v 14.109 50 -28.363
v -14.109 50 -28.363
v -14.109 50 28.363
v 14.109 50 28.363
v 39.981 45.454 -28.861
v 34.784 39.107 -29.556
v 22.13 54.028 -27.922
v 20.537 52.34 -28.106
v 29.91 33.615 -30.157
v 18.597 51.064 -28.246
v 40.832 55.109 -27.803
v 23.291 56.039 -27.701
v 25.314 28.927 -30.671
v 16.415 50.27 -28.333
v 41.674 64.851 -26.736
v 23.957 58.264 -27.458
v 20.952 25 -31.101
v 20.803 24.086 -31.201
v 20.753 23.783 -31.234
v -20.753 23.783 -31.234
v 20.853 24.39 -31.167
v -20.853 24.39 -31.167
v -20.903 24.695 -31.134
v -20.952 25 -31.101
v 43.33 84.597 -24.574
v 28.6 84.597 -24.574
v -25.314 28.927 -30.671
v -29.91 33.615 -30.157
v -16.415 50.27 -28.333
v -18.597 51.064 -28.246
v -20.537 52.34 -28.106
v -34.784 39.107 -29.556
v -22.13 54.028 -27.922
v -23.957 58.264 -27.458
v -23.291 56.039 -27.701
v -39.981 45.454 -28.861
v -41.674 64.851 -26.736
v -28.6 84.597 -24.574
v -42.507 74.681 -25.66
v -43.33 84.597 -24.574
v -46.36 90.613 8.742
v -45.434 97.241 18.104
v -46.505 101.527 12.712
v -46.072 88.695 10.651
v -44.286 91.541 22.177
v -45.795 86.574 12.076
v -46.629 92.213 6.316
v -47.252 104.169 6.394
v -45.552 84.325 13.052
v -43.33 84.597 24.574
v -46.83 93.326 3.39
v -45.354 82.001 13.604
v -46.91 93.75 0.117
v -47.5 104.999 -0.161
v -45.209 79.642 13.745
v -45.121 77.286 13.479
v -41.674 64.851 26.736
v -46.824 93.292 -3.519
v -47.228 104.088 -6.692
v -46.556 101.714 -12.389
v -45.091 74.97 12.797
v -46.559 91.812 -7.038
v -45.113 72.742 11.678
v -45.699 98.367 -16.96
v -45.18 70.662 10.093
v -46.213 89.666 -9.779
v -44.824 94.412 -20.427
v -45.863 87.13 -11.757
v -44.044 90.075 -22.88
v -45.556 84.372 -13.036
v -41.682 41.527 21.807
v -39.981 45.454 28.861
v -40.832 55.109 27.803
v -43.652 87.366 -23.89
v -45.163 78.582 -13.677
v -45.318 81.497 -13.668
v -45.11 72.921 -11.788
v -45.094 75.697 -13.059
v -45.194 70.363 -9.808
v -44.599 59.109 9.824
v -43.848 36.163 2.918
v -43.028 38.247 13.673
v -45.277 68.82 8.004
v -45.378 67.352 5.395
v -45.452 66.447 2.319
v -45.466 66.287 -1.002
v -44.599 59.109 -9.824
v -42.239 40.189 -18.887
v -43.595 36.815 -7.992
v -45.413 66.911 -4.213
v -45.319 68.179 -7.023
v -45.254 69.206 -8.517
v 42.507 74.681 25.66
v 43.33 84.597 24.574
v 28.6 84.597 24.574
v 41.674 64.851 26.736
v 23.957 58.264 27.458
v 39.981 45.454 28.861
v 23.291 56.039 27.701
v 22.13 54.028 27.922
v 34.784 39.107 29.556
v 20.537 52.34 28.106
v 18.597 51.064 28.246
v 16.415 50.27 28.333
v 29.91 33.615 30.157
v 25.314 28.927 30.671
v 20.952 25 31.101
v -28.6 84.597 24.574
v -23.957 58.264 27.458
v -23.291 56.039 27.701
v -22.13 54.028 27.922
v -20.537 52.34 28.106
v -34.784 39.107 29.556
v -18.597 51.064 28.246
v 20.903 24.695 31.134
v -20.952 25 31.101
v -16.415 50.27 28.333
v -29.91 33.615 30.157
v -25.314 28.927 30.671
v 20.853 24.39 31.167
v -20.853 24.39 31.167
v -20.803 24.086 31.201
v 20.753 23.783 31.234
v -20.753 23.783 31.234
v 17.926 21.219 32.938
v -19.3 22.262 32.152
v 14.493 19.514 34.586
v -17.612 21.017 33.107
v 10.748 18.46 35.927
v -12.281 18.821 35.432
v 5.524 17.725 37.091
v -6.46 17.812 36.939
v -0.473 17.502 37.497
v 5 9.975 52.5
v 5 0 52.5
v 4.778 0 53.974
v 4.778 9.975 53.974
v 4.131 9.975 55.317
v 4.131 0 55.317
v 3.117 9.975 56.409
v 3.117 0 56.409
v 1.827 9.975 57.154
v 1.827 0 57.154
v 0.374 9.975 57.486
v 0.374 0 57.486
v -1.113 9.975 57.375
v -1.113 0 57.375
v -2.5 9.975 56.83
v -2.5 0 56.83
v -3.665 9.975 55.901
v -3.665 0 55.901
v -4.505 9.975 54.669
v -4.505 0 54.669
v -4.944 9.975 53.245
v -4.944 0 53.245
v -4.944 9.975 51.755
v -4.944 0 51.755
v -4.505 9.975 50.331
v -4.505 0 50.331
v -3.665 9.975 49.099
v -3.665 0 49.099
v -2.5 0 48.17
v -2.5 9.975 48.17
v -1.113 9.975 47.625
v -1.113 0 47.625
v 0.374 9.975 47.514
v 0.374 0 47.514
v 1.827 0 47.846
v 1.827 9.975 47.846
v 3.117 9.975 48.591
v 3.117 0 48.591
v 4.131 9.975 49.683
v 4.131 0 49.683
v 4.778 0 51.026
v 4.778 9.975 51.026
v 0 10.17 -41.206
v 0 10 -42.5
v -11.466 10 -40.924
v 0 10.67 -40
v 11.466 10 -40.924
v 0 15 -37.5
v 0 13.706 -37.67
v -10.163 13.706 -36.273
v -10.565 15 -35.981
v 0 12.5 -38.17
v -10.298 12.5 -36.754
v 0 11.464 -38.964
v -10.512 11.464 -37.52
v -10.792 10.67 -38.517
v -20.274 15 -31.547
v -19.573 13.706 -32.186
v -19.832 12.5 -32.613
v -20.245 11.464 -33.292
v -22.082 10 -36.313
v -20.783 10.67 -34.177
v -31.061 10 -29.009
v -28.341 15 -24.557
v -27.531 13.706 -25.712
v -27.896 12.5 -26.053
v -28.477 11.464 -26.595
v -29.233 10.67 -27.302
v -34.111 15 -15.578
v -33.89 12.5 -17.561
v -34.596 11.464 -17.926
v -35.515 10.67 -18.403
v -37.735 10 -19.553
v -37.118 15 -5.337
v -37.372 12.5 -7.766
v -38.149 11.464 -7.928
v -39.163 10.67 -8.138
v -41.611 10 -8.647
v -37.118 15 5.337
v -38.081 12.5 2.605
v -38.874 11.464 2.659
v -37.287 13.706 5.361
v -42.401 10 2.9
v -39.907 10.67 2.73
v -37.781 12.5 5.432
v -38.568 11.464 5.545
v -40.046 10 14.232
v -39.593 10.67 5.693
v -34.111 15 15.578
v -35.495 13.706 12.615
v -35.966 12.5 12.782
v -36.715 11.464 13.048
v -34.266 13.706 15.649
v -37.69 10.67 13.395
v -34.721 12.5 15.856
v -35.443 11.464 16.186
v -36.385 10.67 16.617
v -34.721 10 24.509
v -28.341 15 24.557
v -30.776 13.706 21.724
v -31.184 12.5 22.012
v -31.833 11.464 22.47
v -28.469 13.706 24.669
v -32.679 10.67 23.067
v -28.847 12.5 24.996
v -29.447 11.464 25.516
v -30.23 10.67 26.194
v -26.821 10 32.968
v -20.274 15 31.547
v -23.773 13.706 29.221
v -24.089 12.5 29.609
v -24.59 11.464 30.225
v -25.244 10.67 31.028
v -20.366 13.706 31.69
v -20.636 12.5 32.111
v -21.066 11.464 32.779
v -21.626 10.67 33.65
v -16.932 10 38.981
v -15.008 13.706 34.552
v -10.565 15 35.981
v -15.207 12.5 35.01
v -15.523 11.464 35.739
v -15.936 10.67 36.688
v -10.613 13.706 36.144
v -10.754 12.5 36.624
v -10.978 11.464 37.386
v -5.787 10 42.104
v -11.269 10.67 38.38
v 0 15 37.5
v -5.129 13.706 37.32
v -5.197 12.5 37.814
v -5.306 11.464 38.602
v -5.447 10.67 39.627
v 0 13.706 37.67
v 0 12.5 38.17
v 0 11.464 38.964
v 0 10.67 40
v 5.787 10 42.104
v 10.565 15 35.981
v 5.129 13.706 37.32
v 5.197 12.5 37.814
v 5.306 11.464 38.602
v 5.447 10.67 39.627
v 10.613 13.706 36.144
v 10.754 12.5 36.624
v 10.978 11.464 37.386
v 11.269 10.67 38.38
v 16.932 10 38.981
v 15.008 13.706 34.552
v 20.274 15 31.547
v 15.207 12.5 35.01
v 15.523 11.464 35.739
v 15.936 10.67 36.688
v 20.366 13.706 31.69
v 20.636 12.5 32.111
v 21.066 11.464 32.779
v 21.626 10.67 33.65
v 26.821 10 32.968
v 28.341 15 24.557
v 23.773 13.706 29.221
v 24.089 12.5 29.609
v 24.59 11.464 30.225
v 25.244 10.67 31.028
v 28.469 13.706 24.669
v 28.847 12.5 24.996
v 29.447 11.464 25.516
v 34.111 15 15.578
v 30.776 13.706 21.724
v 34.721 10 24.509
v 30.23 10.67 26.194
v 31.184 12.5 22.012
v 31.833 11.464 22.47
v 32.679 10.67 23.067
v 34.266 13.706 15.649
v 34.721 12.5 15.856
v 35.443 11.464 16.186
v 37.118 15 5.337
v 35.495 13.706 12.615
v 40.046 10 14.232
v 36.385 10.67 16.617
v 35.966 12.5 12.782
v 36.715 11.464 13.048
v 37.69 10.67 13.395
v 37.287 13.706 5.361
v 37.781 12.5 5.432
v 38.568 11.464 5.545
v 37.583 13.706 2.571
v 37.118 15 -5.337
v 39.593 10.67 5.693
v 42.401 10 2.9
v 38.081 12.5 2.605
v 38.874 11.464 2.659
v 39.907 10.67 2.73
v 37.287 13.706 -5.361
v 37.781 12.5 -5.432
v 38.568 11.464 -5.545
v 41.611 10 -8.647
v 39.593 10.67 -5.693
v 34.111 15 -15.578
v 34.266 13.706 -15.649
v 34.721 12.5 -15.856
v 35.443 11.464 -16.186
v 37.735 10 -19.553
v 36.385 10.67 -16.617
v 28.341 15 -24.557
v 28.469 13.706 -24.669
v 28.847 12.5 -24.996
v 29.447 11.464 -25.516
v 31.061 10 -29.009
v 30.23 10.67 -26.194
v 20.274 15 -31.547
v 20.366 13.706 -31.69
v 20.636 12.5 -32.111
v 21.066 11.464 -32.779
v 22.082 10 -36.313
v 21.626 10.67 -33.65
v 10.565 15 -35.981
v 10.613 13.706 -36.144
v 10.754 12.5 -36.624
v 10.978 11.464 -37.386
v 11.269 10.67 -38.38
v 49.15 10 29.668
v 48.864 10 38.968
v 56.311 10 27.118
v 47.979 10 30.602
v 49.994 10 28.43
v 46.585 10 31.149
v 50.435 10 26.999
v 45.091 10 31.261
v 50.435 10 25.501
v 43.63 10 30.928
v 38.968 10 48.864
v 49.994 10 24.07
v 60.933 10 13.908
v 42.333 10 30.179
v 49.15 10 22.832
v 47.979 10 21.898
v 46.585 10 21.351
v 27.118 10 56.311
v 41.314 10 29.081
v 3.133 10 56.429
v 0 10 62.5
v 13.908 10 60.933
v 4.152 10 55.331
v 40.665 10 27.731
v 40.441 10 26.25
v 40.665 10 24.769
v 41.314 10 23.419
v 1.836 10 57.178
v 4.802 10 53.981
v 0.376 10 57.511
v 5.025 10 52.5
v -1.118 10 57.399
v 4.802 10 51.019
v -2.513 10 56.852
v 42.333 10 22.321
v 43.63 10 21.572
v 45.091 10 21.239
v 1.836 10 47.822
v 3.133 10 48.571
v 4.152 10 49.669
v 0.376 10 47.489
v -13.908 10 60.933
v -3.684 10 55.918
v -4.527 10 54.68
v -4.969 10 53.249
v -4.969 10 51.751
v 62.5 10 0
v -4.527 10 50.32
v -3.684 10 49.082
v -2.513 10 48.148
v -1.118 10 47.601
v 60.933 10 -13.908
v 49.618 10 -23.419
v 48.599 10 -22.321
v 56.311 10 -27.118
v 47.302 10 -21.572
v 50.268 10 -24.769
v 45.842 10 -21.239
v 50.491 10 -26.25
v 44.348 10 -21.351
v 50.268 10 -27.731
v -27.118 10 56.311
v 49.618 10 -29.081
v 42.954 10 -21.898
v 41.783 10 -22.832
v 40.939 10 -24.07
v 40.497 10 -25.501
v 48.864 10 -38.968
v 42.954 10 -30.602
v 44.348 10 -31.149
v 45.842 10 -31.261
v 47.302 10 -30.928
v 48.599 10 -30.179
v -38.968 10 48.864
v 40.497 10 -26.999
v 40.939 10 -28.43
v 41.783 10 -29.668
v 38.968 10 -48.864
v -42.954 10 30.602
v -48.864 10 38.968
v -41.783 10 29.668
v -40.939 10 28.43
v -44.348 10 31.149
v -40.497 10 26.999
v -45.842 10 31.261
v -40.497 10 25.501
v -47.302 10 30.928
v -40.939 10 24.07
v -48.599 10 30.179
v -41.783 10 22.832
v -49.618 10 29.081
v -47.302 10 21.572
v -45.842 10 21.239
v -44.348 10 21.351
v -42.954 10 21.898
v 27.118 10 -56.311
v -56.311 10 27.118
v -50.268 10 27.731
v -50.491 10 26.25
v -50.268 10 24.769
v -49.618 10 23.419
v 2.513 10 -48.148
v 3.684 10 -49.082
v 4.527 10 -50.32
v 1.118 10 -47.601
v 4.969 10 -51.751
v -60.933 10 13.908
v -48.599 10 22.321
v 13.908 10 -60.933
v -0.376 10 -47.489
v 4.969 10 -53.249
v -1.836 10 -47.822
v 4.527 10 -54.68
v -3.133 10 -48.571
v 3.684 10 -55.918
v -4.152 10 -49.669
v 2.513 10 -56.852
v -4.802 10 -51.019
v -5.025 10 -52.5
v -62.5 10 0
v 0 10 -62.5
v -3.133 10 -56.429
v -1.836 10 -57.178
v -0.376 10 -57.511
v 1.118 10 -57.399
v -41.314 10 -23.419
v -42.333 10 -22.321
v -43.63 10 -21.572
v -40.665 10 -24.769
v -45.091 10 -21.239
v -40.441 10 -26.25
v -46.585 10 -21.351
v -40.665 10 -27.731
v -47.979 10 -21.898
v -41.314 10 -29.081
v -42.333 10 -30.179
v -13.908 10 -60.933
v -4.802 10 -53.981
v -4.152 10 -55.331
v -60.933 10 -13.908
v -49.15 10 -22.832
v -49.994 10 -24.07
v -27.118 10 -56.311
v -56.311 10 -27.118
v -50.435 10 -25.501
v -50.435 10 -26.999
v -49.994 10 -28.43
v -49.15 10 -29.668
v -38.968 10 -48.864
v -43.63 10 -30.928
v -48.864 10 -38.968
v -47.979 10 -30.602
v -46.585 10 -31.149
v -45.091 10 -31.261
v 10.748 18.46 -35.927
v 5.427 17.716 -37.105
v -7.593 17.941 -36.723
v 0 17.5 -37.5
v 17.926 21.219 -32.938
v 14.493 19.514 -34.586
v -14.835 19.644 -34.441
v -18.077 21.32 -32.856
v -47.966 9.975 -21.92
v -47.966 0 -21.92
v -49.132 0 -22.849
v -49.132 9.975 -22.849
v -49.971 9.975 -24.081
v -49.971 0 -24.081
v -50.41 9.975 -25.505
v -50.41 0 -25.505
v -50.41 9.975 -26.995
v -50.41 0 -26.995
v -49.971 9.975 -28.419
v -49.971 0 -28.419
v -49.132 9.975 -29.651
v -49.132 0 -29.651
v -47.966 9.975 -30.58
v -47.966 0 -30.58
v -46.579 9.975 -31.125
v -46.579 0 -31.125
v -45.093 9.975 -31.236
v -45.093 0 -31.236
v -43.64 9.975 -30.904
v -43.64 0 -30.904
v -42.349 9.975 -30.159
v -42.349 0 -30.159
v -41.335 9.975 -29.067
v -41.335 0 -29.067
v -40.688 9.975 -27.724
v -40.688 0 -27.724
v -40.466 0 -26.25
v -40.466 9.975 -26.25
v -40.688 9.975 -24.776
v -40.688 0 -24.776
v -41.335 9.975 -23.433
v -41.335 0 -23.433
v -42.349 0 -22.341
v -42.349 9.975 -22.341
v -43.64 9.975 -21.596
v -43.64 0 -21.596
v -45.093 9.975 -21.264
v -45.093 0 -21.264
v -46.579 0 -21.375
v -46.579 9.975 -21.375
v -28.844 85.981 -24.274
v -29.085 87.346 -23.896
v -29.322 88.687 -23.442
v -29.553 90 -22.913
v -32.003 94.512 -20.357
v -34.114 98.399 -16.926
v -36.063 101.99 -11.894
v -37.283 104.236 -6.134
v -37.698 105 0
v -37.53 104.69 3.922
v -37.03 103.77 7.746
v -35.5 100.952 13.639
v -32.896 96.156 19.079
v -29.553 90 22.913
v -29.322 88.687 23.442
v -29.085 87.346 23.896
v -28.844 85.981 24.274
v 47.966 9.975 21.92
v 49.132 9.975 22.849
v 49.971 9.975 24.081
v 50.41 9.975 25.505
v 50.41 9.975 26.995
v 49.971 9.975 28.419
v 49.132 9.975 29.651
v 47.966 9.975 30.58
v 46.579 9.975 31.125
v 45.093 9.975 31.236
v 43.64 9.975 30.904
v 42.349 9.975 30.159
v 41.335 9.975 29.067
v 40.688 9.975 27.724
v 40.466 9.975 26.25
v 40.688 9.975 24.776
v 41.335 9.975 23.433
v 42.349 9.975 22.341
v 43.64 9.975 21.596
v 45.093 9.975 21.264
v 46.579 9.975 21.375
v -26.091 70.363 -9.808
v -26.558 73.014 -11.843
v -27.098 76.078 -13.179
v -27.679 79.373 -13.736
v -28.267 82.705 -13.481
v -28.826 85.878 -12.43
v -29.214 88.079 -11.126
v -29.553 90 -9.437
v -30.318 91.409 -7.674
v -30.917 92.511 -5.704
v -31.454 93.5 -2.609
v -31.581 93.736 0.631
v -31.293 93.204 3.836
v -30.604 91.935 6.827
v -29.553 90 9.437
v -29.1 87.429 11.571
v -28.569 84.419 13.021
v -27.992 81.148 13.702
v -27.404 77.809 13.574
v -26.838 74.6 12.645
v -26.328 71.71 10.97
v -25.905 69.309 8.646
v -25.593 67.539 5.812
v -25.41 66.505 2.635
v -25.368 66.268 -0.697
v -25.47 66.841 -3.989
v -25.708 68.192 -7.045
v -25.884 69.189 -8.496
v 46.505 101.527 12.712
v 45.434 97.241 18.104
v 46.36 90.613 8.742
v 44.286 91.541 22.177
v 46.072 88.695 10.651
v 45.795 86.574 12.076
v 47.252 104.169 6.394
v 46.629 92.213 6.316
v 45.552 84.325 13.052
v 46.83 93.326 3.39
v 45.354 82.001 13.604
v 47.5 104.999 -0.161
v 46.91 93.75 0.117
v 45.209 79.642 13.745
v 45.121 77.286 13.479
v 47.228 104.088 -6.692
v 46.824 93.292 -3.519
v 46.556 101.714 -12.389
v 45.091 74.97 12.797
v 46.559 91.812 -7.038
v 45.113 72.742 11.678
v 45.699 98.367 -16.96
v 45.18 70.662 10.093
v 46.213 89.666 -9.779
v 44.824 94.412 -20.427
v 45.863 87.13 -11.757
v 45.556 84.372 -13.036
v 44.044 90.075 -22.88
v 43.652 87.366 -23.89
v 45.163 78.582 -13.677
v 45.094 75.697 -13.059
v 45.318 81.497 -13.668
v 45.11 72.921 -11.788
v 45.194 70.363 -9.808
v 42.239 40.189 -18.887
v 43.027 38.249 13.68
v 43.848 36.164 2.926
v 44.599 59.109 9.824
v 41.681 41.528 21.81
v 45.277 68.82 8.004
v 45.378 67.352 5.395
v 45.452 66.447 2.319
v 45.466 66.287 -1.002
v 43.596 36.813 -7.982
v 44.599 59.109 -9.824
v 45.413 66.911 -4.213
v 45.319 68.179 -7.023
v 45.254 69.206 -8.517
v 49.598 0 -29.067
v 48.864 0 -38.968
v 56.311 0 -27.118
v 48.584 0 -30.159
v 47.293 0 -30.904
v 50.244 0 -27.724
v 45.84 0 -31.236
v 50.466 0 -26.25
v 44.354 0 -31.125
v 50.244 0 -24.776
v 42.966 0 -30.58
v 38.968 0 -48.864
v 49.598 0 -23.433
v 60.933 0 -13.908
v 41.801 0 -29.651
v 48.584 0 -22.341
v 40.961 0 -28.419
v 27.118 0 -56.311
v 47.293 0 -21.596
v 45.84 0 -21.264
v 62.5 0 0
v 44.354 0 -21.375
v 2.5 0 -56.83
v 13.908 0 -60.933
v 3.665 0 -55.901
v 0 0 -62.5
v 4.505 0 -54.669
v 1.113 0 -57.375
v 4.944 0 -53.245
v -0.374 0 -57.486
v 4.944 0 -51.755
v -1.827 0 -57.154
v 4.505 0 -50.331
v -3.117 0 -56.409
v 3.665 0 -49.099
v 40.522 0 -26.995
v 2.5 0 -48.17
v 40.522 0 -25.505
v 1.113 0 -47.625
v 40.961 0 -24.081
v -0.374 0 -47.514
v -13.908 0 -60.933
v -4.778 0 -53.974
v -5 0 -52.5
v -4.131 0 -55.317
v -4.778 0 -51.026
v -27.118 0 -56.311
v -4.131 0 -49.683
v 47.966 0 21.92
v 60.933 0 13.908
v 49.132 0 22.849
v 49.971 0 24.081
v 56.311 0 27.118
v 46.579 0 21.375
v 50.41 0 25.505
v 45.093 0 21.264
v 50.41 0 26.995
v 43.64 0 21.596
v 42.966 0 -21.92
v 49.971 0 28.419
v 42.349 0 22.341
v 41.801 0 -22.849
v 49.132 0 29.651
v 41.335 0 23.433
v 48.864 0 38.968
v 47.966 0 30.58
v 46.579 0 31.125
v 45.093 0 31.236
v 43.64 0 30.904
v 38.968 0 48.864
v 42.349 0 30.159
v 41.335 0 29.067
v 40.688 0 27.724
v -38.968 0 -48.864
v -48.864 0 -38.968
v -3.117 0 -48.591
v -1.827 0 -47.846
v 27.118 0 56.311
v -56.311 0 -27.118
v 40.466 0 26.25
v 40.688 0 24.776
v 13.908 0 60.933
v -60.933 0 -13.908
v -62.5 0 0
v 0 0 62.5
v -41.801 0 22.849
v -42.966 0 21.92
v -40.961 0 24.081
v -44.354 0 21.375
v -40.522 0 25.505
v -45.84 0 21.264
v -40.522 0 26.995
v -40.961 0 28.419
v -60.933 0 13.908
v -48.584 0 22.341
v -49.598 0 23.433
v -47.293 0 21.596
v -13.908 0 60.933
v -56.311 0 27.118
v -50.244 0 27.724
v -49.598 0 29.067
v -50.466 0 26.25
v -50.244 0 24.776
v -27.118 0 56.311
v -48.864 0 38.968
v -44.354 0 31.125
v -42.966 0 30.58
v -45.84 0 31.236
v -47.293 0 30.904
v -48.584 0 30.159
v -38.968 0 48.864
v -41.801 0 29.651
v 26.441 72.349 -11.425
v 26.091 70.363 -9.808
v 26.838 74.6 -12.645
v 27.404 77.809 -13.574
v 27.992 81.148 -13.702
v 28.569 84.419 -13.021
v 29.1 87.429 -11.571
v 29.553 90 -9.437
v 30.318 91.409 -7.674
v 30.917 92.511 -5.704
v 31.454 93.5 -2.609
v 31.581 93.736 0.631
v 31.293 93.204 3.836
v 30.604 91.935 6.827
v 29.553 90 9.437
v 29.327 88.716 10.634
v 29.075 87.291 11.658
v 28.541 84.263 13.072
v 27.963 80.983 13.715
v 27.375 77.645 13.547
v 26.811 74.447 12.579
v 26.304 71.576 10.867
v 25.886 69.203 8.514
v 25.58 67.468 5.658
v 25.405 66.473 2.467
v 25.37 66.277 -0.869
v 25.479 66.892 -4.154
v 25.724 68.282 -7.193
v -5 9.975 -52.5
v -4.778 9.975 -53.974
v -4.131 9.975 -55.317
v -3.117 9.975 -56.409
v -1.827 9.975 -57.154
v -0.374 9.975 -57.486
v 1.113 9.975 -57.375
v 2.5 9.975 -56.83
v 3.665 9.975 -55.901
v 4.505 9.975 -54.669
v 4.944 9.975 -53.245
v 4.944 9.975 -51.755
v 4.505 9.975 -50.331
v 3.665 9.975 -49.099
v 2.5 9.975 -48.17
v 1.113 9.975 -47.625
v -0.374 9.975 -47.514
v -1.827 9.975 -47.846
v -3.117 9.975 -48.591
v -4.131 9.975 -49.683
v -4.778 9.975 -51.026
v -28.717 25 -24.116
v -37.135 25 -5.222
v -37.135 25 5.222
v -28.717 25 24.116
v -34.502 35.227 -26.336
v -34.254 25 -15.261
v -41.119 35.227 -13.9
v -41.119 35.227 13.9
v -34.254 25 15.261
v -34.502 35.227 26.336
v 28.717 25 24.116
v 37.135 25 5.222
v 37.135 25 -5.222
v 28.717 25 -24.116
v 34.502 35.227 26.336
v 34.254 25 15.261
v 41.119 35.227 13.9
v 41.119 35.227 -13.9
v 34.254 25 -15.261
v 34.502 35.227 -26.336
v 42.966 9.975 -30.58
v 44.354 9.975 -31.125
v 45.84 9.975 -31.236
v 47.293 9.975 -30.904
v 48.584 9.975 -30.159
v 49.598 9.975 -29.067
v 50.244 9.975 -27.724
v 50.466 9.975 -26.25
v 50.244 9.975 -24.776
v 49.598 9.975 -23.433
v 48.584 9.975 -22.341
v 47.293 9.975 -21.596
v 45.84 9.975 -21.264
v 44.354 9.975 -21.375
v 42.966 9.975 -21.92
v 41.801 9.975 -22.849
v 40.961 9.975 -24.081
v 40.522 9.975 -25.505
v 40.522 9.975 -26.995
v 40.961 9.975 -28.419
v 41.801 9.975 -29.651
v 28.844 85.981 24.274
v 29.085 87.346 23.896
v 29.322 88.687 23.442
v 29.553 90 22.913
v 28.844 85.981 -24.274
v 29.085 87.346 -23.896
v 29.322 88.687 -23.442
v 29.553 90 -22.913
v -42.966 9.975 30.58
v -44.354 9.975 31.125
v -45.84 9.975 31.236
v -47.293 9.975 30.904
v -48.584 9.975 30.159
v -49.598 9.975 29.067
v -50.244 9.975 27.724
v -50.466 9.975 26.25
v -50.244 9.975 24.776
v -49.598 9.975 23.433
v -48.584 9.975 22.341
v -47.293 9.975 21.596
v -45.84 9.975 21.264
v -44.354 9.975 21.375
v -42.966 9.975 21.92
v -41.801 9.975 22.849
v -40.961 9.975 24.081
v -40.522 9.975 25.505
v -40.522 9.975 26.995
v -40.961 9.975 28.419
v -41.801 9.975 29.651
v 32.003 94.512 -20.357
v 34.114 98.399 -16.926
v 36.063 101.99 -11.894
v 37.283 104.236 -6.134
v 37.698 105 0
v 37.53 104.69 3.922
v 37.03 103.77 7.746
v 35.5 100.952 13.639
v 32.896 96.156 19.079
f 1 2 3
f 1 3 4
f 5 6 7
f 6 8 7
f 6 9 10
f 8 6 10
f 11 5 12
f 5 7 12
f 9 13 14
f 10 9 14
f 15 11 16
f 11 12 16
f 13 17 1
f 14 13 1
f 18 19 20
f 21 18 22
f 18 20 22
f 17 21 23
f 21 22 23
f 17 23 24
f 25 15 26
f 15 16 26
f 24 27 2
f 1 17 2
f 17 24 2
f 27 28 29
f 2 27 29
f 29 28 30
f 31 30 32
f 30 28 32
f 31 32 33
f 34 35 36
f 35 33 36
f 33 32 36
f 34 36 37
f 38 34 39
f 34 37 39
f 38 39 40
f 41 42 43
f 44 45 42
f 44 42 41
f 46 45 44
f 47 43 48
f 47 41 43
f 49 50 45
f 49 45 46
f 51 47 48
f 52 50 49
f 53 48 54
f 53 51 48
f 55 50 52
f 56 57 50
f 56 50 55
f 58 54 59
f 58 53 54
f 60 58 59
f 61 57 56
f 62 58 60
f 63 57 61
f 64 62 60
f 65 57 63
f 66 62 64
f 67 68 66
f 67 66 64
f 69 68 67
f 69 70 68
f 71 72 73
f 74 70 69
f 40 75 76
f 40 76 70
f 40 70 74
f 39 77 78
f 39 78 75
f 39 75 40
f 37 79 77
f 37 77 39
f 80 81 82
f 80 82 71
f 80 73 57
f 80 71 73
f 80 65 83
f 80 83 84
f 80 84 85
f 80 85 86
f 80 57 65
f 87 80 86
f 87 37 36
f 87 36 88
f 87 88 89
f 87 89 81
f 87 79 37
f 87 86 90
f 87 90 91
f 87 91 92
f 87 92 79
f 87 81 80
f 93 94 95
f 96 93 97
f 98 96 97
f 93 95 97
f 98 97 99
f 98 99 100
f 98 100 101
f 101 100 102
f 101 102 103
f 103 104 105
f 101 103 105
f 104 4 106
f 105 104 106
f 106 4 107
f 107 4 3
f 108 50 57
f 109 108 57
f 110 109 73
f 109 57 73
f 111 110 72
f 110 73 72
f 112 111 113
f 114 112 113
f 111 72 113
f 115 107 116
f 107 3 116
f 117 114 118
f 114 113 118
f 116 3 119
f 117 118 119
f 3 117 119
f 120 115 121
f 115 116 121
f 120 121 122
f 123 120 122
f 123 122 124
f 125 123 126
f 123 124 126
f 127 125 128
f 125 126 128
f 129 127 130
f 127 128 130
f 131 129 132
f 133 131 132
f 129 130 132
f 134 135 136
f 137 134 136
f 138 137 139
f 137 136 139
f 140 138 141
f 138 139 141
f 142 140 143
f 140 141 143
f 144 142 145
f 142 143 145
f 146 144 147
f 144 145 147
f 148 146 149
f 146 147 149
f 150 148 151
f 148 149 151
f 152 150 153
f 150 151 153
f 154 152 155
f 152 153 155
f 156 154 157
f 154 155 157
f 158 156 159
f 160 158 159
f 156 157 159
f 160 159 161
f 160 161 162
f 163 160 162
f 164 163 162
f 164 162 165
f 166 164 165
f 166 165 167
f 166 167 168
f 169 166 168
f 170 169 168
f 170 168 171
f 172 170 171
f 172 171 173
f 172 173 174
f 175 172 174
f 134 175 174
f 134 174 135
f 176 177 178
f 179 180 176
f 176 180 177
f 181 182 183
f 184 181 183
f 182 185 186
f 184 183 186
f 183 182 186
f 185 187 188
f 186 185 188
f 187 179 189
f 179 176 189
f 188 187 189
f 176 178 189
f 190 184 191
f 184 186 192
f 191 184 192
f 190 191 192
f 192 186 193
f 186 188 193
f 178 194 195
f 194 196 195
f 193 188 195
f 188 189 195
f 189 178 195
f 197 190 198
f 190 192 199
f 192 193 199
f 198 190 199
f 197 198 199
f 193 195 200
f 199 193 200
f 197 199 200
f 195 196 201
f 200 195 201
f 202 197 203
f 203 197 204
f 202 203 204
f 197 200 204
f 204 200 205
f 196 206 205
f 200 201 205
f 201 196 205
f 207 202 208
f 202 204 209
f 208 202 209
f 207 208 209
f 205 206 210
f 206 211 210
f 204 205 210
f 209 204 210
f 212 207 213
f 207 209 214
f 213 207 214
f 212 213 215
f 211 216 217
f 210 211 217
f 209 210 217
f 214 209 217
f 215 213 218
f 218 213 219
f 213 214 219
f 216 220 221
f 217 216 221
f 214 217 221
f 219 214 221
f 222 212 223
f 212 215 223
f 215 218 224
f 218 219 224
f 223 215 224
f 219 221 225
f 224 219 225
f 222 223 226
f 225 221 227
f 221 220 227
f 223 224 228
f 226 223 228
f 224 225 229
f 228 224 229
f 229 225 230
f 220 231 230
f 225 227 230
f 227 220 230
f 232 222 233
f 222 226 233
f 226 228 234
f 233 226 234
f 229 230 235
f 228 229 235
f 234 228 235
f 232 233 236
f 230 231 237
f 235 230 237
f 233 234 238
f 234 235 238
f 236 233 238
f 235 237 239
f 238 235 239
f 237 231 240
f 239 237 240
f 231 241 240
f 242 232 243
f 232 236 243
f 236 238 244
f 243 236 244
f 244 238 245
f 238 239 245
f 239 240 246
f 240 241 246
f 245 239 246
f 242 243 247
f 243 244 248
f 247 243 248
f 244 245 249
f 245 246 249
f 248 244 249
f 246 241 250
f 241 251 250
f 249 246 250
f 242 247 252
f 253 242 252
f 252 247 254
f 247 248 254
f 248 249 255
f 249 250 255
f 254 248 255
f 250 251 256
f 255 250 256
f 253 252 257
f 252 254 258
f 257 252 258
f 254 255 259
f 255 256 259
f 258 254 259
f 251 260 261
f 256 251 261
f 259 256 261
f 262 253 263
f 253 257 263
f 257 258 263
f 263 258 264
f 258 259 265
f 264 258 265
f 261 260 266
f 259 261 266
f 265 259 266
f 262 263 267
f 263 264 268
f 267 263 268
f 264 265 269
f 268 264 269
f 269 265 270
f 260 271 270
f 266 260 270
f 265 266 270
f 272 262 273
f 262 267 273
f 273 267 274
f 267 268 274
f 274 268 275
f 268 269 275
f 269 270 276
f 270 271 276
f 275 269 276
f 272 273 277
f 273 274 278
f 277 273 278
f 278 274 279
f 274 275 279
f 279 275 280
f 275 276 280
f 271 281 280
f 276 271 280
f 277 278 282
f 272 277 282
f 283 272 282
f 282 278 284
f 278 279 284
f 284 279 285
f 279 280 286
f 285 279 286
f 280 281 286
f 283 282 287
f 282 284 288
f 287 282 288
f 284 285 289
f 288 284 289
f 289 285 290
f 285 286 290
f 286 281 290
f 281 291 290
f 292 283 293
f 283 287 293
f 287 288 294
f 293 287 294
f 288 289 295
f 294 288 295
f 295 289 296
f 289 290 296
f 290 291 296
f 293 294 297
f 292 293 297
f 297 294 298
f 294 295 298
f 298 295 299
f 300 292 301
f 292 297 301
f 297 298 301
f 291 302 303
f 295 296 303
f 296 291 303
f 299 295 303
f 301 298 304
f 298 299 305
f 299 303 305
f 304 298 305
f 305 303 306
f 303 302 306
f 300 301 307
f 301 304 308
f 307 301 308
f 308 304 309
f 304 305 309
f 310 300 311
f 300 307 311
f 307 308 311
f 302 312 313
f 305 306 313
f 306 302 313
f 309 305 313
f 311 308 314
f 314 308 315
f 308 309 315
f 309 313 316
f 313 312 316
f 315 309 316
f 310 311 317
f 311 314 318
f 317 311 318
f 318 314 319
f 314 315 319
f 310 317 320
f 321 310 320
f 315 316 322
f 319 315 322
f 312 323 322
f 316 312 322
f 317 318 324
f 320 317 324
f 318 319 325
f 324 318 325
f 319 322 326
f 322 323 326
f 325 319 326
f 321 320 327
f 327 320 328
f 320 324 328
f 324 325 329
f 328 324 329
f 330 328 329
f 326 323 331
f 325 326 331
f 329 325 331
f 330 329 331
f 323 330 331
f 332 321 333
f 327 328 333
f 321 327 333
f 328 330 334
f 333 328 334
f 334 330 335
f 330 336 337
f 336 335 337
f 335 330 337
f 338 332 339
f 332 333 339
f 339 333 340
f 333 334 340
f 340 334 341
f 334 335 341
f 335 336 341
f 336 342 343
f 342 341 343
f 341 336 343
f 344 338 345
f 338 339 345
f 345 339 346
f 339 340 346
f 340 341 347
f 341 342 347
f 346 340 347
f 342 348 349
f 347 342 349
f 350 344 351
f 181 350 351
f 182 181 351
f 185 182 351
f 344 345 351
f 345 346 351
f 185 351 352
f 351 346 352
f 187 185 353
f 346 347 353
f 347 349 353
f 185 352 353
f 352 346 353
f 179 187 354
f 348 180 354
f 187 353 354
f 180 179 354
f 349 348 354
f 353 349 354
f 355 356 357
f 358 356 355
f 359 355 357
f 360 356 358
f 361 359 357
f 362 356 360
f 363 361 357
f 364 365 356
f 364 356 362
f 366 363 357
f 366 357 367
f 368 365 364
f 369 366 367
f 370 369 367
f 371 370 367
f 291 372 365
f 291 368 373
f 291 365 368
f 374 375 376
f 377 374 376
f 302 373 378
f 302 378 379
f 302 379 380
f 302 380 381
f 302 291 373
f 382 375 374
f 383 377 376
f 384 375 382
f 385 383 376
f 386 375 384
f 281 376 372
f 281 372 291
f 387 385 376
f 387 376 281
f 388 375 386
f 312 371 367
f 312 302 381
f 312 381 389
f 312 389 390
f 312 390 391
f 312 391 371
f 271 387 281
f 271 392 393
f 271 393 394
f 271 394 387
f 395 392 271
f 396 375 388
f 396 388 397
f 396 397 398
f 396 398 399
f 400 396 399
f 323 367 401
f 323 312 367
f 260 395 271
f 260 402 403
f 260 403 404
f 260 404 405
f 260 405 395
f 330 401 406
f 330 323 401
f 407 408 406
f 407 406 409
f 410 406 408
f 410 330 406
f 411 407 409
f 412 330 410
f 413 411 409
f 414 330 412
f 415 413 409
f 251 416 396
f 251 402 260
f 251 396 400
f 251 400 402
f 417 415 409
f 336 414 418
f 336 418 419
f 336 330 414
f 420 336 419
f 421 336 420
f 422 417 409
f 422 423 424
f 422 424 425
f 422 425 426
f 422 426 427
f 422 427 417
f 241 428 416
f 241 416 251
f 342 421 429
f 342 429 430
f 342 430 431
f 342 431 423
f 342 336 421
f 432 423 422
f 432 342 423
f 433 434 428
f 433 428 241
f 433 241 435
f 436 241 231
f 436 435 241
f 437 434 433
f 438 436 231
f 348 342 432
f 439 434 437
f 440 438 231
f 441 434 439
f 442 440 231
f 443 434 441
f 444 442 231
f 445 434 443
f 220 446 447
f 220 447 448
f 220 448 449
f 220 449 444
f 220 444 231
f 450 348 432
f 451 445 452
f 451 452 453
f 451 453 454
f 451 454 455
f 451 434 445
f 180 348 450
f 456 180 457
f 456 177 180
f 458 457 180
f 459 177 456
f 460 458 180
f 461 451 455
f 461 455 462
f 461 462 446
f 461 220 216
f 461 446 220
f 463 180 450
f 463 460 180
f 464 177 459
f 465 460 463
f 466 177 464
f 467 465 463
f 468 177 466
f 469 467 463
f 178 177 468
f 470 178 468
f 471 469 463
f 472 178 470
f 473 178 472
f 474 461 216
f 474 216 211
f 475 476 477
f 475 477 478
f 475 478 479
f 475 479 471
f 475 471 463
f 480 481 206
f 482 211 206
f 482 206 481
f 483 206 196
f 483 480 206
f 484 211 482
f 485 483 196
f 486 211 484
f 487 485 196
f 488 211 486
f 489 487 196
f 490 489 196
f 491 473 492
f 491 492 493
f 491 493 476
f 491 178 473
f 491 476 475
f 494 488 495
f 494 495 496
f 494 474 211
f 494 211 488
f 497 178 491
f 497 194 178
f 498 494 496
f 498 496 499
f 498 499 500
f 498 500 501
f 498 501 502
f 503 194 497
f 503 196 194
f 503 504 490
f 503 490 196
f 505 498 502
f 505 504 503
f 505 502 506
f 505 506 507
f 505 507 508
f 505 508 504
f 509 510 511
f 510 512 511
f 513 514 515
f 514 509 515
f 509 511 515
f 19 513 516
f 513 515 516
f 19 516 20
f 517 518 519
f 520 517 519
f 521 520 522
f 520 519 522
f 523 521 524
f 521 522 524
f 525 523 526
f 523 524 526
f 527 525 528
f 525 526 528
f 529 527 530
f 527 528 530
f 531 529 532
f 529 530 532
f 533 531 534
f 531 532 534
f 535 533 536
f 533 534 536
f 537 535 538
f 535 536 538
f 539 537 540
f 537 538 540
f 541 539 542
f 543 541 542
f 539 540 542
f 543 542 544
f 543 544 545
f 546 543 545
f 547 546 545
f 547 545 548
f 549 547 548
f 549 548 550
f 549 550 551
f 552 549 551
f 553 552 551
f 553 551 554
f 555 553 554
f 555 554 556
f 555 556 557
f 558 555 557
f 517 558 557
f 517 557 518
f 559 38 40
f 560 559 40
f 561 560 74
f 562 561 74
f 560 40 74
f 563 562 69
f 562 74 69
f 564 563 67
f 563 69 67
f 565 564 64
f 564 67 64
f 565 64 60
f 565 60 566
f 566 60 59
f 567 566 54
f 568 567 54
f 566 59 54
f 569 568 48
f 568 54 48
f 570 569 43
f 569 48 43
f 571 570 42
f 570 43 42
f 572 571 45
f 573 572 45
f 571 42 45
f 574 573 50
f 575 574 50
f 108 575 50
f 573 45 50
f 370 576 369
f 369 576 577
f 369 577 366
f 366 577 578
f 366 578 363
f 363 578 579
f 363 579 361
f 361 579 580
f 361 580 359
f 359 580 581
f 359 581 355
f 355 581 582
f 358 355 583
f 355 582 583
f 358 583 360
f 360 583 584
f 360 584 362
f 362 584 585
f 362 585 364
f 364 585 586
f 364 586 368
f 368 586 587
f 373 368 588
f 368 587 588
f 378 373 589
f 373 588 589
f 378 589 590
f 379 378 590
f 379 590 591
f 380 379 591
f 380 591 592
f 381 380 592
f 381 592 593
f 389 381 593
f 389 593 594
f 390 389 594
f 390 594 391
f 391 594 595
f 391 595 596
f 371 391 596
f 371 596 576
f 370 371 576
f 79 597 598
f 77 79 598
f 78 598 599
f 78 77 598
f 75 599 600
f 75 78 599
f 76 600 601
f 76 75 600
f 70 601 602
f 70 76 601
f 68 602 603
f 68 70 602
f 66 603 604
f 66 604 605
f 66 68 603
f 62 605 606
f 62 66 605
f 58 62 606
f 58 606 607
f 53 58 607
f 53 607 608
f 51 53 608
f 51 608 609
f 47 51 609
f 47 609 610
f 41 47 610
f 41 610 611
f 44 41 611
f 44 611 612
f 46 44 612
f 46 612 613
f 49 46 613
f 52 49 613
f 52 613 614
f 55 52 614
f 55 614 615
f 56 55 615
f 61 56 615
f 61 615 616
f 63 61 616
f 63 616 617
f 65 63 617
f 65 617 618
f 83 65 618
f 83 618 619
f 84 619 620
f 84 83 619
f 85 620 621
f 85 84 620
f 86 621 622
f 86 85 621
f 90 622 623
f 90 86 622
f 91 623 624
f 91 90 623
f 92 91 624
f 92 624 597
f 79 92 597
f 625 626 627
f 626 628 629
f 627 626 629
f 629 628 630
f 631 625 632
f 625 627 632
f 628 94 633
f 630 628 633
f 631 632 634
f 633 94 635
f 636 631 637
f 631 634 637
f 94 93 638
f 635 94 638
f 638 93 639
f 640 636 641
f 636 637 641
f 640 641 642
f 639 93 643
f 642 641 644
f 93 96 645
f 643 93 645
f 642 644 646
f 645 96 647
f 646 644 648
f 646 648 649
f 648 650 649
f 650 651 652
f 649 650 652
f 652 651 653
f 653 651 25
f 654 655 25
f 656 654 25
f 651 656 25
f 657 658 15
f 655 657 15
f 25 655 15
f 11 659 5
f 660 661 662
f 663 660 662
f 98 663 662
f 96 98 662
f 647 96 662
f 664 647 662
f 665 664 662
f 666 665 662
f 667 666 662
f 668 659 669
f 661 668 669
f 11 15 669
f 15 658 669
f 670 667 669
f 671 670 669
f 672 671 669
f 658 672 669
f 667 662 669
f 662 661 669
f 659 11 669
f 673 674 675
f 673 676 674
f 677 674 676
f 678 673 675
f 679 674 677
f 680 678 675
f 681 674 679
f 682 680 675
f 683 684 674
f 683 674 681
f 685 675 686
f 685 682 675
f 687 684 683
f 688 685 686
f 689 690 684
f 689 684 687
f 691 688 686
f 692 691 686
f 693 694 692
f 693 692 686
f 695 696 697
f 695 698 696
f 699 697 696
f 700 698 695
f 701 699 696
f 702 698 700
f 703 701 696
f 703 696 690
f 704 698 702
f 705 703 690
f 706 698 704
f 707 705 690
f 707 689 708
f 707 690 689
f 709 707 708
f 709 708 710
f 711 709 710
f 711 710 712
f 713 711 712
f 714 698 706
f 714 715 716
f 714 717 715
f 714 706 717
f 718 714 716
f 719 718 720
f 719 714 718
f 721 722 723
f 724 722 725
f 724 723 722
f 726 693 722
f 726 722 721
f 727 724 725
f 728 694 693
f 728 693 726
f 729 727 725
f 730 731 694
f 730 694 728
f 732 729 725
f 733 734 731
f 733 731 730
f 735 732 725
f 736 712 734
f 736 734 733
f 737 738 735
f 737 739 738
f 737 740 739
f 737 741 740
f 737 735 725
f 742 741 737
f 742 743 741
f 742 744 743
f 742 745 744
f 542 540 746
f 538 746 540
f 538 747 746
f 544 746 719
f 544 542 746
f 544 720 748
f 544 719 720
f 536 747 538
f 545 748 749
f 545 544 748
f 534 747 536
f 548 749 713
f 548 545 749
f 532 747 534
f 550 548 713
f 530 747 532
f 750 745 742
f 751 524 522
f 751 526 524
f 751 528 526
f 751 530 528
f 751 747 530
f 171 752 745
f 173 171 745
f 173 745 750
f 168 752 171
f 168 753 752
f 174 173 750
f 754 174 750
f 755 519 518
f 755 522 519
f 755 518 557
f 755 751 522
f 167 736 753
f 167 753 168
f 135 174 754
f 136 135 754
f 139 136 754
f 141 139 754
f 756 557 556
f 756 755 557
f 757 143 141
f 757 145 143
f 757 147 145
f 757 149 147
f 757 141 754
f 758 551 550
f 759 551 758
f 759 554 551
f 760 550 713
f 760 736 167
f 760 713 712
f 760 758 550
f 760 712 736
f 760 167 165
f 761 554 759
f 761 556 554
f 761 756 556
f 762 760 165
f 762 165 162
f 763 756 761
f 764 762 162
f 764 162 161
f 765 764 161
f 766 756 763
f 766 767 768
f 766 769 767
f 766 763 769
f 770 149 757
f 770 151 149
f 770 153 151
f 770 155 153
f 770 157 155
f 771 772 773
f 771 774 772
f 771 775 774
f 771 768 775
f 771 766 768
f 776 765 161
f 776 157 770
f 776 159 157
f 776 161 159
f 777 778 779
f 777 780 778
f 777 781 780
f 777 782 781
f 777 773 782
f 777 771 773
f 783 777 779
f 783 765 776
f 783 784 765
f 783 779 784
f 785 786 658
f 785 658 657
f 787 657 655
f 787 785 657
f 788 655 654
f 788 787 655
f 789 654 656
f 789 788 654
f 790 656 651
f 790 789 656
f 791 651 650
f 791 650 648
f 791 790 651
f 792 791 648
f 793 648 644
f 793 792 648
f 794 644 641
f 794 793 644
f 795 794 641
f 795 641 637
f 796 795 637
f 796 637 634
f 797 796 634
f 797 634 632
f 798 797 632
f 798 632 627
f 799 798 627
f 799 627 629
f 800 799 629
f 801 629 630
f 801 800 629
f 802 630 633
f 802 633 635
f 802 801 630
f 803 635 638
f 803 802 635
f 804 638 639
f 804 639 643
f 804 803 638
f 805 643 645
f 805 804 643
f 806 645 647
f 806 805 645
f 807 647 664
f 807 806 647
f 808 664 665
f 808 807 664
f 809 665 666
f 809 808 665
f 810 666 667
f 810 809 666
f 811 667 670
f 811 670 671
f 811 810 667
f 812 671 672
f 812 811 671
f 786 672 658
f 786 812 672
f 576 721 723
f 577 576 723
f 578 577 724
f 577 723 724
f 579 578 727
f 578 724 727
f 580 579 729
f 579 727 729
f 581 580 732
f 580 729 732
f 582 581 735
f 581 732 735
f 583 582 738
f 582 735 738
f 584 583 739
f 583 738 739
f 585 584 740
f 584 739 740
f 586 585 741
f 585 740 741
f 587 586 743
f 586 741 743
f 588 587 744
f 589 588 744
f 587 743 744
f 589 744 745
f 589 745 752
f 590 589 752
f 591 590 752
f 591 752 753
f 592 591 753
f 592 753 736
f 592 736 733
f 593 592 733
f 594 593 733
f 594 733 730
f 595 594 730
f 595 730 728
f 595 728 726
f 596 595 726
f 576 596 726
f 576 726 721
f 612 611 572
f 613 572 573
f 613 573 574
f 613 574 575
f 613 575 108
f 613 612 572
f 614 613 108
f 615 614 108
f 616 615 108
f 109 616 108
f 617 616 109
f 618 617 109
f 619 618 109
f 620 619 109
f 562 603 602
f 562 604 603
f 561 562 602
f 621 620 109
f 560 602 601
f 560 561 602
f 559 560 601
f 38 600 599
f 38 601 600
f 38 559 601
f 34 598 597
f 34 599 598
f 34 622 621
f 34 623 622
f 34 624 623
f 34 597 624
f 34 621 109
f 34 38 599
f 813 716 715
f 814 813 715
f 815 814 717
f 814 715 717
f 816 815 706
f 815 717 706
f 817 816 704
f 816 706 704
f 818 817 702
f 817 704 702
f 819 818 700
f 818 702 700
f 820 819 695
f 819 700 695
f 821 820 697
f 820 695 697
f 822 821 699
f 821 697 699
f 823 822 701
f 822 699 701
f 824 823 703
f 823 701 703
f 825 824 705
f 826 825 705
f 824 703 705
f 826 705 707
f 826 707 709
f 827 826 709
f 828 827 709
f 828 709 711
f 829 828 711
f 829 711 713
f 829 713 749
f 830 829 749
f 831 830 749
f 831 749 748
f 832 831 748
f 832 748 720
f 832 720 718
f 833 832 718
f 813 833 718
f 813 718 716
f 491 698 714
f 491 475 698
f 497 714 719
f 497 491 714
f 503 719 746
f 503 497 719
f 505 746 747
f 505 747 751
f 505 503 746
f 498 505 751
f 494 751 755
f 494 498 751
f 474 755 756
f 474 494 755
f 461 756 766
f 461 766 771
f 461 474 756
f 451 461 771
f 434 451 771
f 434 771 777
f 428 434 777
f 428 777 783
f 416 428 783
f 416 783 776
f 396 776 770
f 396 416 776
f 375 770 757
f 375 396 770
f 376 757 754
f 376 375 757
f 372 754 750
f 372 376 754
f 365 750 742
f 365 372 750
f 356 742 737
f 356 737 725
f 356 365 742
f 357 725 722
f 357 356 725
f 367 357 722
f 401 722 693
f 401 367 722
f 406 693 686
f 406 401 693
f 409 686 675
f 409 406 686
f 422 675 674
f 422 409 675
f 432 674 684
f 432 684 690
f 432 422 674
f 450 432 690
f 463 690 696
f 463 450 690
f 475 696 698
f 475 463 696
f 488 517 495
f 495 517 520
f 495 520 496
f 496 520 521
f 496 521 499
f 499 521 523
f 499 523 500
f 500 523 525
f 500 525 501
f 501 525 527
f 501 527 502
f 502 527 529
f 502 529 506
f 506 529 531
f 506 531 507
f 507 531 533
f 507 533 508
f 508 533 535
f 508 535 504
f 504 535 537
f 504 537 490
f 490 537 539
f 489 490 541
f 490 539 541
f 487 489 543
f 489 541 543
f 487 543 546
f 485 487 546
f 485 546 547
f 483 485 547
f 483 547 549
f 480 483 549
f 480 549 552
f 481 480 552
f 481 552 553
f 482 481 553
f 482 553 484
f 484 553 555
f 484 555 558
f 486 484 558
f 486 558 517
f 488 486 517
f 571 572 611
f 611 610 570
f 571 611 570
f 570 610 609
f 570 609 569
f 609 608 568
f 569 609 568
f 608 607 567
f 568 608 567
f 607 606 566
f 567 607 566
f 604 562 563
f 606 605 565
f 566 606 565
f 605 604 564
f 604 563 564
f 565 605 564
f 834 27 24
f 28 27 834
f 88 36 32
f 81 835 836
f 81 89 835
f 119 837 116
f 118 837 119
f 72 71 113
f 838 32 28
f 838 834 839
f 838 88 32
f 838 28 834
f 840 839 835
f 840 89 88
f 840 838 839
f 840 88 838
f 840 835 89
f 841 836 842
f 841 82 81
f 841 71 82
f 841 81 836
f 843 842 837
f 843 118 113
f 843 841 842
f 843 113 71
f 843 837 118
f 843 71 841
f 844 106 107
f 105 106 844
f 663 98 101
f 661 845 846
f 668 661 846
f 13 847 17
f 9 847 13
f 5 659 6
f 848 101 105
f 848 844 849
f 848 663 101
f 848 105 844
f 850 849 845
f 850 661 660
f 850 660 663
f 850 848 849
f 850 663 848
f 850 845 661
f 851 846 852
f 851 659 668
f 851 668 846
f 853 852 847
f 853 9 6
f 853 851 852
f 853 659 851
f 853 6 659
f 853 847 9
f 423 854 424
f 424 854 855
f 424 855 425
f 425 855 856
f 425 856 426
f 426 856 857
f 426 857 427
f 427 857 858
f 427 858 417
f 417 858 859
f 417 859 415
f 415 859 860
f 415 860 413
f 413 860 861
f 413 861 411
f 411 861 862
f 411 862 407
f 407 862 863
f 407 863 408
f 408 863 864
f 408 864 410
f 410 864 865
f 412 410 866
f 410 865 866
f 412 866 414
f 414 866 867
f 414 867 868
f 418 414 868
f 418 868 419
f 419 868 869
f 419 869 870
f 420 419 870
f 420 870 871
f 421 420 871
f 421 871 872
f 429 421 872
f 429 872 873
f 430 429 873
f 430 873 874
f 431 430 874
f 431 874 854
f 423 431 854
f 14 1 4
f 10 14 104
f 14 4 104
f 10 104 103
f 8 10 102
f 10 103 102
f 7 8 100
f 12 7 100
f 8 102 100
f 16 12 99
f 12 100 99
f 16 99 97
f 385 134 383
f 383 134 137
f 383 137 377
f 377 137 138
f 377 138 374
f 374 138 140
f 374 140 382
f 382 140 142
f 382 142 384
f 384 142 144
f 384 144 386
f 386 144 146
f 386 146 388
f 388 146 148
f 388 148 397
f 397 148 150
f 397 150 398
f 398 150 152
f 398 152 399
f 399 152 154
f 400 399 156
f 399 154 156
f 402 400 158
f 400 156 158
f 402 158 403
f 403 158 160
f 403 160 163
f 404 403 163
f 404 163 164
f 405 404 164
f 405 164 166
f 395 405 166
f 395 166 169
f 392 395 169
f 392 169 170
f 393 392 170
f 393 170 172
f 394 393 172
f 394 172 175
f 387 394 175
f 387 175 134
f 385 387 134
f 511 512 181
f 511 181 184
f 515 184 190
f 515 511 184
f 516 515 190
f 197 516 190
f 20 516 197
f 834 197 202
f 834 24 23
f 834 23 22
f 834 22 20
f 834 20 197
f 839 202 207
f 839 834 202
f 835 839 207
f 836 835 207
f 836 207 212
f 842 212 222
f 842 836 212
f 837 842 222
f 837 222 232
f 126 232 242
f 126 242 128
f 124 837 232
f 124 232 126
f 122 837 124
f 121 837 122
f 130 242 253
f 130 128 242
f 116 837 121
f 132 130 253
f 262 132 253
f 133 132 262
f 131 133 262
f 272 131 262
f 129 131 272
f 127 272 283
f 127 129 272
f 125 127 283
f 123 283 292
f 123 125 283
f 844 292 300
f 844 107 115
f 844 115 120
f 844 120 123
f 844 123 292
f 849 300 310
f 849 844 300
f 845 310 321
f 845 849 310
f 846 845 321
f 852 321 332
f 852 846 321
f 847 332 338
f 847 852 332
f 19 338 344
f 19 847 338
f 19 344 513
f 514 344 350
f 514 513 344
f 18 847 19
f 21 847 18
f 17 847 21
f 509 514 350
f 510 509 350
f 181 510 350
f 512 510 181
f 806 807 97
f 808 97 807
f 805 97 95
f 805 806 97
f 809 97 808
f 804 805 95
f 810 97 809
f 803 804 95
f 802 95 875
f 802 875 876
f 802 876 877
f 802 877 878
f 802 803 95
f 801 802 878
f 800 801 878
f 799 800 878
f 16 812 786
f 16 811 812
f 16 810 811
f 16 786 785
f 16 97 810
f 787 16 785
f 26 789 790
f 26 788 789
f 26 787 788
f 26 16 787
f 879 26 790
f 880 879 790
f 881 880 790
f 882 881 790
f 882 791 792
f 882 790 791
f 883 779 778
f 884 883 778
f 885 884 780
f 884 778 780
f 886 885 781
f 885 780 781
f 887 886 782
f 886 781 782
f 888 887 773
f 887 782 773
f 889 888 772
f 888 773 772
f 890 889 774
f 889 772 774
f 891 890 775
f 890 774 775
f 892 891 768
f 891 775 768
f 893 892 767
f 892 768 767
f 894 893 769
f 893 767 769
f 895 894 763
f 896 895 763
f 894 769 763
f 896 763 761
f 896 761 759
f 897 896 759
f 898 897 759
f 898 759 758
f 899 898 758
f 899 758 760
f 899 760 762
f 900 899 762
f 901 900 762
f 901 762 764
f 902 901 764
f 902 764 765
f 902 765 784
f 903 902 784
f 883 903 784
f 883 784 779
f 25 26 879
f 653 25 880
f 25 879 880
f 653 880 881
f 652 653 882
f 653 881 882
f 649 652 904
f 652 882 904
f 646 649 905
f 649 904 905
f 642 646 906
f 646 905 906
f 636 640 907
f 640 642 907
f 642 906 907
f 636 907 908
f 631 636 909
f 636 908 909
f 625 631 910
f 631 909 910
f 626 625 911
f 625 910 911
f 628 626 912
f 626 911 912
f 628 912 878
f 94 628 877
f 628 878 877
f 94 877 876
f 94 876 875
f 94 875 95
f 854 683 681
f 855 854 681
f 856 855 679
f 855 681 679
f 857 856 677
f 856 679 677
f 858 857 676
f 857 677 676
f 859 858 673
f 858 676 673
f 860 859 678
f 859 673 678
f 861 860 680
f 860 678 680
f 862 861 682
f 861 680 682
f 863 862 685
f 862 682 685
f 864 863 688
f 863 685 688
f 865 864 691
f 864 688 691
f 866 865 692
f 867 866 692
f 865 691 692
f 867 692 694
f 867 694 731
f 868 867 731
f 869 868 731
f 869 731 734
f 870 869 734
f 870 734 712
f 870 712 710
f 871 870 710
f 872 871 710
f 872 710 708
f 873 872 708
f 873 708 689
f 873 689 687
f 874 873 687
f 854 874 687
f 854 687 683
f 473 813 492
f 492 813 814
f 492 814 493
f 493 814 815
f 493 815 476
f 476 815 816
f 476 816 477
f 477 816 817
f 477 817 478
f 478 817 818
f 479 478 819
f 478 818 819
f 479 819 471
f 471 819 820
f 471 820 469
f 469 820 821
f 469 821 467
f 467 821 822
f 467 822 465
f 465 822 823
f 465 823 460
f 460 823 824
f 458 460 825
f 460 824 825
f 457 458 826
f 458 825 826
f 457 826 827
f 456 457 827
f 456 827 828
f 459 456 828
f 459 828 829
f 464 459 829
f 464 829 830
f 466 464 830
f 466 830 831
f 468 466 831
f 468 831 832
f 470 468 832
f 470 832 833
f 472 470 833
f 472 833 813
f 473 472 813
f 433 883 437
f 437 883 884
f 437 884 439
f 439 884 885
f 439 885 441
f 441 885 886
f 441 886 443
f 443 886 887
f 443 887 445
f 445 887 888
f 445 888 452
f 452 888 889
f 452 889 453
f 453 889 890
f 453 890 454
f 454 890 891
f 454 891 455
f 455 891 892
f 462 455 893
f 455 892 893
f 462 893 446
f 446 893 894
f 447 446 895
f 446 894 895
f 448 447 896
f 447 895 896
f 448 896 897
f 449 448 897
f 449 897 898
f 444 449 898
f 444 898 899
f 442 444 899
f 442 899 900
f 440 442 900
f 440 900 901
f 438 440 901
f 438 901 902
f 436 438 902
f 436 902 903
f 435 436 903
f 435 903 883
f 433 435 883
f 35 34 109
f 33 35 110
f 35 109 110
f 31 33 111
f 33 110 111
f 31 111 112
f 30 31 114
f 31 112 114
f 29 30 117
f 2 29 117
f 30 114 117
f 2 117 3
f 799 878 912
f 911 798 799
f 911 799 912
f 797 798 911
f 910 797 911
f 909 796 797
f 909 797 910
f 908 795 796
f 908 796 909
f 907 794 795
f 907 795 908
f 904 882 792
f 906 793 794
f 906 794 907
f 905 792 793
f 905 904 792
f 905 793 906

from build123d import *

# Parameters (mm, degrees)
CUT_EXTRUDE1_DEPTH                   = 159.216212497
CUT_EXTRUDE1_DEPTH_BACK              = 159.216212497
CUT_REVOLVE1_ANGLE                   = 45
CUT_EXTRUDE2_DEPTH                   = 138.24977239
CUT_EXTRUDE2_DEPTH_BACK              = 138.24977239
CUT_EXTRUDE3_DEPTH                   = 138.24977239
CUT_EXTRUDE3_DEPTH_BACK              = 138.24977239
CUT_EXTRUDE4_DEPTH                   = 138.24977239
CUT_EXTRUDE4_DEPTH_BACK              = 138.24977239
SKETCH6_R                            = 13.75
F_10_0_10_DIAMETER_HOLE1_D           = 10
F_10_0_10_DIAMETER_HOLE1_DEPTH       = 10
F_10_0_10_DIAMETER_HOLE1_CSINK_D     = 10.05
F_10_0_10_DIAMETER_HOLE1_CSINK_ANGLE = 90
CIRPATTERN1_COUNT                    = 6
FILLET3_R                            = 10
FILLET4_R                            = 5


with BuildPart() as part:
    # Sketch1 → Revolve1 (revolve)
    with BuildSketch(Plane.XY, mode=Mode.PRIVATE) as revolve1_sk:
        Polygon((0, 0), (-62.5, 0), (-62.5, 10), (-37.5, 10), (-37.5, 25), (-83.688021535, 105), (0, 105), align=None)
    revolve(revolve1_sk.sketch.rotate(Axis((0, 0, 0), (0, 1, 0)), 270), axis=Axis((0, 0, 0), (0, 1, 0)))

    # Sketch2 → Cut-Extrude1 (cut, two sides: drawn at the far end of the back side and taken through both)
    with BuildSketch(Plane(origin=(0, 0, 0), x_dir=(0, 0, -1), z_dir=(1, 0, 0)).offset(-CUT_EXTRUDE1_DEPTH_BACK)):
        with BuildLine():
            Line((-24.573687175, 84.59716202), (-31.233944355, 23.782787827))
            ThreePointArc((-31.233944355, 23.782787827), (-33.891761116, 20.167448423), (-37.5, 17.5))
            Line((-37.5, 17.5), (-101.023811283, 17.5))
            Line((-101.023811283, 17.5), (-101.023811283, 124.521875929))
            Line((-101.023811283, 124.521875929), (93.829847102, 124.521875929))
            Line((93.829847102, 124.521875929), (93.829847102, 17.5))
            Line((93.829847102, 17.5), (37.5, 17.5))
            ThreePointArc((37.5, 17.5), (33.891761116, 20.167448423), (31.233944355, 23.782787827))
            Line((31.233944355, 23.782787827), (24.573687175, 84.59716202))
            ThreePointArc((24.573687175, 84.59716202), (0, 105), (-24.573687175, 84.59716202))
        make_face()
    extrude(amount=CUT_EXTRUDE1_DEPTH + CUT_EXTRUDE1_DEPTH_BACK, mode=Mode.SUBTRACT)

    # Sketch3 → Cut-Revolve1 (revolve, symmetric, cut)
    with BuildSketch(Plane.XY) as cut_revolve1_sk:
        Polygon((47.5, 105), (43.500508947, 28.685164541), (102.973812388, 28.685164541), (102.973812388, 105), align=None)
    cut_revolve1 = revolve(axis=Axis((-52.5, 30.66973461, 0), (0, 1, 0)), revolution_arc=CUT_REVOLVE1_ANGLE / 2, mode=Mode.SUBTRACT)
    cut_revolve1 = cut_revolve1 + revolve(cut_revolve1_sk.sketch, axis=Axis((-52.5, 30.66973461, 0), (0, -1, 0)), revolution_arc=CUT_REVOLVE1_ANGLE / 2, mode=Mode.SUBTRACT)

    # Mirror1: Cut-Revolve1 across plane
    add(cut_revolve1.mirror(Plane(origin=(0, 0, 0), x_dir=(0, 0, 1), z_dir=(1, 0, 0))), mode=Mode.SUBTRACT)

    # Sketch4 → Cut-Extrude2 (cut, two sides: drawn at the far end of the back side and taken through both)
    with BuildSketch(Plane.XY.offset(-CUT_EXTRUDE2_DEPTH_BACK)):
        Polygon((-32.197983939, 105), (-22.5, 50), (22.5, 50), (32.197983939, 105), align=None)
    extrude(amount=CUT_EXTRUDE2_DEPTH + CUT_EXTRUDE2_DEPTH_BACK, mode=Mode.SUBTRACT)

    # Sketch5 → Cut-Extrude3 (cut, two sides: drawn at the far end of the back side and taken through both)
    with BuildSketch(Plane.XY.offset(-CUT_EXTRUDE3_DEPTH_BACK)):
        Polygon((37.697983939, 105), (32.197983939, 105), (29.553079228, 90), align=None)
        Polygon((-29.553079228, 90), (-37.697983939, 105), (-32.197983939, 105), align=None)
    extrude(amount=CUT_EXTRUDE3_DEPTH + CUT_EXTRUDE3_DEPTH_BACK, mode=Mode.SUBTRACT)

    # Sketch6 → Cut-Extrude4 (cut, two sides: drawn at the far end of the back side and taken through both)
    with BuildSketch(Plane(origin=(0, 0, 0), x_dir=(0, 0, -1), z_dir=(1, 0, 0)).offset(-CUT_EXTRUDE4_DEPTH_BACK)):
        with Locations(Location((0, 80, 0), (0, 0, 315.504858884))):
            Circle(SKETCH6_R)
    extrude(amount=CUT_EXTRUDE4_DEPTH + CUT_EXTRUDE4_DEPTH_BACK, mode=Mode.SUBTRACT)

    # Ø10.0 (10) Diameter Hole1
    with Locations(Plane(origin=(0, 10, 0), x_dir=(1, 0, 0), z_dir=(0, 1, 0))):
        with Locations((0, 52.5)):
            f_10_0_10_diameter_hole1 = CounterSinkHole(F_10_0_10_DIAMETER_HOLE1_D / 2, F_10_0_10_DIAMETER_HOLE1_CSINK_D / 2, depth=F_10_0_10_DIAMETER_HOLE1_DEPTH, counter_sink_angle=F_10_0_10_DIAMETER_HOLE1_CSINK_ANGLE)

    # CirPattern1: Ø10.0 (10) Diameter Hole1 ×6 about axis
    cirpattern1_axis = Axis((0, 0, 0), (0, 1, 0))
    for i in range(1, CIRPATTERN1_COUNT):
        add(f_10_0_10_diameter_hole1.rotate(cirpattern1_axis, i * 360 / CIRPATTERN1_COUNT), mode=Mode.SUBTRACT)

    # Fillet3
    fillet3_edges = [part.edges().sort_by_distance(p)[0] for p in [
        (22.5, 50, 0),
        (-22.5, 50, 0),
    ]]
    fillet(fillet3_edges, radius=FILLET3_R)

    # Fillet4
    fillet4_edges = [part.edges().sort_by_distance(p)[0] for p in [
        (0, 10, 37.5),
    ]]
    fillet(fillet4_edges, radius=FILLET4_R)


solid = part.part
